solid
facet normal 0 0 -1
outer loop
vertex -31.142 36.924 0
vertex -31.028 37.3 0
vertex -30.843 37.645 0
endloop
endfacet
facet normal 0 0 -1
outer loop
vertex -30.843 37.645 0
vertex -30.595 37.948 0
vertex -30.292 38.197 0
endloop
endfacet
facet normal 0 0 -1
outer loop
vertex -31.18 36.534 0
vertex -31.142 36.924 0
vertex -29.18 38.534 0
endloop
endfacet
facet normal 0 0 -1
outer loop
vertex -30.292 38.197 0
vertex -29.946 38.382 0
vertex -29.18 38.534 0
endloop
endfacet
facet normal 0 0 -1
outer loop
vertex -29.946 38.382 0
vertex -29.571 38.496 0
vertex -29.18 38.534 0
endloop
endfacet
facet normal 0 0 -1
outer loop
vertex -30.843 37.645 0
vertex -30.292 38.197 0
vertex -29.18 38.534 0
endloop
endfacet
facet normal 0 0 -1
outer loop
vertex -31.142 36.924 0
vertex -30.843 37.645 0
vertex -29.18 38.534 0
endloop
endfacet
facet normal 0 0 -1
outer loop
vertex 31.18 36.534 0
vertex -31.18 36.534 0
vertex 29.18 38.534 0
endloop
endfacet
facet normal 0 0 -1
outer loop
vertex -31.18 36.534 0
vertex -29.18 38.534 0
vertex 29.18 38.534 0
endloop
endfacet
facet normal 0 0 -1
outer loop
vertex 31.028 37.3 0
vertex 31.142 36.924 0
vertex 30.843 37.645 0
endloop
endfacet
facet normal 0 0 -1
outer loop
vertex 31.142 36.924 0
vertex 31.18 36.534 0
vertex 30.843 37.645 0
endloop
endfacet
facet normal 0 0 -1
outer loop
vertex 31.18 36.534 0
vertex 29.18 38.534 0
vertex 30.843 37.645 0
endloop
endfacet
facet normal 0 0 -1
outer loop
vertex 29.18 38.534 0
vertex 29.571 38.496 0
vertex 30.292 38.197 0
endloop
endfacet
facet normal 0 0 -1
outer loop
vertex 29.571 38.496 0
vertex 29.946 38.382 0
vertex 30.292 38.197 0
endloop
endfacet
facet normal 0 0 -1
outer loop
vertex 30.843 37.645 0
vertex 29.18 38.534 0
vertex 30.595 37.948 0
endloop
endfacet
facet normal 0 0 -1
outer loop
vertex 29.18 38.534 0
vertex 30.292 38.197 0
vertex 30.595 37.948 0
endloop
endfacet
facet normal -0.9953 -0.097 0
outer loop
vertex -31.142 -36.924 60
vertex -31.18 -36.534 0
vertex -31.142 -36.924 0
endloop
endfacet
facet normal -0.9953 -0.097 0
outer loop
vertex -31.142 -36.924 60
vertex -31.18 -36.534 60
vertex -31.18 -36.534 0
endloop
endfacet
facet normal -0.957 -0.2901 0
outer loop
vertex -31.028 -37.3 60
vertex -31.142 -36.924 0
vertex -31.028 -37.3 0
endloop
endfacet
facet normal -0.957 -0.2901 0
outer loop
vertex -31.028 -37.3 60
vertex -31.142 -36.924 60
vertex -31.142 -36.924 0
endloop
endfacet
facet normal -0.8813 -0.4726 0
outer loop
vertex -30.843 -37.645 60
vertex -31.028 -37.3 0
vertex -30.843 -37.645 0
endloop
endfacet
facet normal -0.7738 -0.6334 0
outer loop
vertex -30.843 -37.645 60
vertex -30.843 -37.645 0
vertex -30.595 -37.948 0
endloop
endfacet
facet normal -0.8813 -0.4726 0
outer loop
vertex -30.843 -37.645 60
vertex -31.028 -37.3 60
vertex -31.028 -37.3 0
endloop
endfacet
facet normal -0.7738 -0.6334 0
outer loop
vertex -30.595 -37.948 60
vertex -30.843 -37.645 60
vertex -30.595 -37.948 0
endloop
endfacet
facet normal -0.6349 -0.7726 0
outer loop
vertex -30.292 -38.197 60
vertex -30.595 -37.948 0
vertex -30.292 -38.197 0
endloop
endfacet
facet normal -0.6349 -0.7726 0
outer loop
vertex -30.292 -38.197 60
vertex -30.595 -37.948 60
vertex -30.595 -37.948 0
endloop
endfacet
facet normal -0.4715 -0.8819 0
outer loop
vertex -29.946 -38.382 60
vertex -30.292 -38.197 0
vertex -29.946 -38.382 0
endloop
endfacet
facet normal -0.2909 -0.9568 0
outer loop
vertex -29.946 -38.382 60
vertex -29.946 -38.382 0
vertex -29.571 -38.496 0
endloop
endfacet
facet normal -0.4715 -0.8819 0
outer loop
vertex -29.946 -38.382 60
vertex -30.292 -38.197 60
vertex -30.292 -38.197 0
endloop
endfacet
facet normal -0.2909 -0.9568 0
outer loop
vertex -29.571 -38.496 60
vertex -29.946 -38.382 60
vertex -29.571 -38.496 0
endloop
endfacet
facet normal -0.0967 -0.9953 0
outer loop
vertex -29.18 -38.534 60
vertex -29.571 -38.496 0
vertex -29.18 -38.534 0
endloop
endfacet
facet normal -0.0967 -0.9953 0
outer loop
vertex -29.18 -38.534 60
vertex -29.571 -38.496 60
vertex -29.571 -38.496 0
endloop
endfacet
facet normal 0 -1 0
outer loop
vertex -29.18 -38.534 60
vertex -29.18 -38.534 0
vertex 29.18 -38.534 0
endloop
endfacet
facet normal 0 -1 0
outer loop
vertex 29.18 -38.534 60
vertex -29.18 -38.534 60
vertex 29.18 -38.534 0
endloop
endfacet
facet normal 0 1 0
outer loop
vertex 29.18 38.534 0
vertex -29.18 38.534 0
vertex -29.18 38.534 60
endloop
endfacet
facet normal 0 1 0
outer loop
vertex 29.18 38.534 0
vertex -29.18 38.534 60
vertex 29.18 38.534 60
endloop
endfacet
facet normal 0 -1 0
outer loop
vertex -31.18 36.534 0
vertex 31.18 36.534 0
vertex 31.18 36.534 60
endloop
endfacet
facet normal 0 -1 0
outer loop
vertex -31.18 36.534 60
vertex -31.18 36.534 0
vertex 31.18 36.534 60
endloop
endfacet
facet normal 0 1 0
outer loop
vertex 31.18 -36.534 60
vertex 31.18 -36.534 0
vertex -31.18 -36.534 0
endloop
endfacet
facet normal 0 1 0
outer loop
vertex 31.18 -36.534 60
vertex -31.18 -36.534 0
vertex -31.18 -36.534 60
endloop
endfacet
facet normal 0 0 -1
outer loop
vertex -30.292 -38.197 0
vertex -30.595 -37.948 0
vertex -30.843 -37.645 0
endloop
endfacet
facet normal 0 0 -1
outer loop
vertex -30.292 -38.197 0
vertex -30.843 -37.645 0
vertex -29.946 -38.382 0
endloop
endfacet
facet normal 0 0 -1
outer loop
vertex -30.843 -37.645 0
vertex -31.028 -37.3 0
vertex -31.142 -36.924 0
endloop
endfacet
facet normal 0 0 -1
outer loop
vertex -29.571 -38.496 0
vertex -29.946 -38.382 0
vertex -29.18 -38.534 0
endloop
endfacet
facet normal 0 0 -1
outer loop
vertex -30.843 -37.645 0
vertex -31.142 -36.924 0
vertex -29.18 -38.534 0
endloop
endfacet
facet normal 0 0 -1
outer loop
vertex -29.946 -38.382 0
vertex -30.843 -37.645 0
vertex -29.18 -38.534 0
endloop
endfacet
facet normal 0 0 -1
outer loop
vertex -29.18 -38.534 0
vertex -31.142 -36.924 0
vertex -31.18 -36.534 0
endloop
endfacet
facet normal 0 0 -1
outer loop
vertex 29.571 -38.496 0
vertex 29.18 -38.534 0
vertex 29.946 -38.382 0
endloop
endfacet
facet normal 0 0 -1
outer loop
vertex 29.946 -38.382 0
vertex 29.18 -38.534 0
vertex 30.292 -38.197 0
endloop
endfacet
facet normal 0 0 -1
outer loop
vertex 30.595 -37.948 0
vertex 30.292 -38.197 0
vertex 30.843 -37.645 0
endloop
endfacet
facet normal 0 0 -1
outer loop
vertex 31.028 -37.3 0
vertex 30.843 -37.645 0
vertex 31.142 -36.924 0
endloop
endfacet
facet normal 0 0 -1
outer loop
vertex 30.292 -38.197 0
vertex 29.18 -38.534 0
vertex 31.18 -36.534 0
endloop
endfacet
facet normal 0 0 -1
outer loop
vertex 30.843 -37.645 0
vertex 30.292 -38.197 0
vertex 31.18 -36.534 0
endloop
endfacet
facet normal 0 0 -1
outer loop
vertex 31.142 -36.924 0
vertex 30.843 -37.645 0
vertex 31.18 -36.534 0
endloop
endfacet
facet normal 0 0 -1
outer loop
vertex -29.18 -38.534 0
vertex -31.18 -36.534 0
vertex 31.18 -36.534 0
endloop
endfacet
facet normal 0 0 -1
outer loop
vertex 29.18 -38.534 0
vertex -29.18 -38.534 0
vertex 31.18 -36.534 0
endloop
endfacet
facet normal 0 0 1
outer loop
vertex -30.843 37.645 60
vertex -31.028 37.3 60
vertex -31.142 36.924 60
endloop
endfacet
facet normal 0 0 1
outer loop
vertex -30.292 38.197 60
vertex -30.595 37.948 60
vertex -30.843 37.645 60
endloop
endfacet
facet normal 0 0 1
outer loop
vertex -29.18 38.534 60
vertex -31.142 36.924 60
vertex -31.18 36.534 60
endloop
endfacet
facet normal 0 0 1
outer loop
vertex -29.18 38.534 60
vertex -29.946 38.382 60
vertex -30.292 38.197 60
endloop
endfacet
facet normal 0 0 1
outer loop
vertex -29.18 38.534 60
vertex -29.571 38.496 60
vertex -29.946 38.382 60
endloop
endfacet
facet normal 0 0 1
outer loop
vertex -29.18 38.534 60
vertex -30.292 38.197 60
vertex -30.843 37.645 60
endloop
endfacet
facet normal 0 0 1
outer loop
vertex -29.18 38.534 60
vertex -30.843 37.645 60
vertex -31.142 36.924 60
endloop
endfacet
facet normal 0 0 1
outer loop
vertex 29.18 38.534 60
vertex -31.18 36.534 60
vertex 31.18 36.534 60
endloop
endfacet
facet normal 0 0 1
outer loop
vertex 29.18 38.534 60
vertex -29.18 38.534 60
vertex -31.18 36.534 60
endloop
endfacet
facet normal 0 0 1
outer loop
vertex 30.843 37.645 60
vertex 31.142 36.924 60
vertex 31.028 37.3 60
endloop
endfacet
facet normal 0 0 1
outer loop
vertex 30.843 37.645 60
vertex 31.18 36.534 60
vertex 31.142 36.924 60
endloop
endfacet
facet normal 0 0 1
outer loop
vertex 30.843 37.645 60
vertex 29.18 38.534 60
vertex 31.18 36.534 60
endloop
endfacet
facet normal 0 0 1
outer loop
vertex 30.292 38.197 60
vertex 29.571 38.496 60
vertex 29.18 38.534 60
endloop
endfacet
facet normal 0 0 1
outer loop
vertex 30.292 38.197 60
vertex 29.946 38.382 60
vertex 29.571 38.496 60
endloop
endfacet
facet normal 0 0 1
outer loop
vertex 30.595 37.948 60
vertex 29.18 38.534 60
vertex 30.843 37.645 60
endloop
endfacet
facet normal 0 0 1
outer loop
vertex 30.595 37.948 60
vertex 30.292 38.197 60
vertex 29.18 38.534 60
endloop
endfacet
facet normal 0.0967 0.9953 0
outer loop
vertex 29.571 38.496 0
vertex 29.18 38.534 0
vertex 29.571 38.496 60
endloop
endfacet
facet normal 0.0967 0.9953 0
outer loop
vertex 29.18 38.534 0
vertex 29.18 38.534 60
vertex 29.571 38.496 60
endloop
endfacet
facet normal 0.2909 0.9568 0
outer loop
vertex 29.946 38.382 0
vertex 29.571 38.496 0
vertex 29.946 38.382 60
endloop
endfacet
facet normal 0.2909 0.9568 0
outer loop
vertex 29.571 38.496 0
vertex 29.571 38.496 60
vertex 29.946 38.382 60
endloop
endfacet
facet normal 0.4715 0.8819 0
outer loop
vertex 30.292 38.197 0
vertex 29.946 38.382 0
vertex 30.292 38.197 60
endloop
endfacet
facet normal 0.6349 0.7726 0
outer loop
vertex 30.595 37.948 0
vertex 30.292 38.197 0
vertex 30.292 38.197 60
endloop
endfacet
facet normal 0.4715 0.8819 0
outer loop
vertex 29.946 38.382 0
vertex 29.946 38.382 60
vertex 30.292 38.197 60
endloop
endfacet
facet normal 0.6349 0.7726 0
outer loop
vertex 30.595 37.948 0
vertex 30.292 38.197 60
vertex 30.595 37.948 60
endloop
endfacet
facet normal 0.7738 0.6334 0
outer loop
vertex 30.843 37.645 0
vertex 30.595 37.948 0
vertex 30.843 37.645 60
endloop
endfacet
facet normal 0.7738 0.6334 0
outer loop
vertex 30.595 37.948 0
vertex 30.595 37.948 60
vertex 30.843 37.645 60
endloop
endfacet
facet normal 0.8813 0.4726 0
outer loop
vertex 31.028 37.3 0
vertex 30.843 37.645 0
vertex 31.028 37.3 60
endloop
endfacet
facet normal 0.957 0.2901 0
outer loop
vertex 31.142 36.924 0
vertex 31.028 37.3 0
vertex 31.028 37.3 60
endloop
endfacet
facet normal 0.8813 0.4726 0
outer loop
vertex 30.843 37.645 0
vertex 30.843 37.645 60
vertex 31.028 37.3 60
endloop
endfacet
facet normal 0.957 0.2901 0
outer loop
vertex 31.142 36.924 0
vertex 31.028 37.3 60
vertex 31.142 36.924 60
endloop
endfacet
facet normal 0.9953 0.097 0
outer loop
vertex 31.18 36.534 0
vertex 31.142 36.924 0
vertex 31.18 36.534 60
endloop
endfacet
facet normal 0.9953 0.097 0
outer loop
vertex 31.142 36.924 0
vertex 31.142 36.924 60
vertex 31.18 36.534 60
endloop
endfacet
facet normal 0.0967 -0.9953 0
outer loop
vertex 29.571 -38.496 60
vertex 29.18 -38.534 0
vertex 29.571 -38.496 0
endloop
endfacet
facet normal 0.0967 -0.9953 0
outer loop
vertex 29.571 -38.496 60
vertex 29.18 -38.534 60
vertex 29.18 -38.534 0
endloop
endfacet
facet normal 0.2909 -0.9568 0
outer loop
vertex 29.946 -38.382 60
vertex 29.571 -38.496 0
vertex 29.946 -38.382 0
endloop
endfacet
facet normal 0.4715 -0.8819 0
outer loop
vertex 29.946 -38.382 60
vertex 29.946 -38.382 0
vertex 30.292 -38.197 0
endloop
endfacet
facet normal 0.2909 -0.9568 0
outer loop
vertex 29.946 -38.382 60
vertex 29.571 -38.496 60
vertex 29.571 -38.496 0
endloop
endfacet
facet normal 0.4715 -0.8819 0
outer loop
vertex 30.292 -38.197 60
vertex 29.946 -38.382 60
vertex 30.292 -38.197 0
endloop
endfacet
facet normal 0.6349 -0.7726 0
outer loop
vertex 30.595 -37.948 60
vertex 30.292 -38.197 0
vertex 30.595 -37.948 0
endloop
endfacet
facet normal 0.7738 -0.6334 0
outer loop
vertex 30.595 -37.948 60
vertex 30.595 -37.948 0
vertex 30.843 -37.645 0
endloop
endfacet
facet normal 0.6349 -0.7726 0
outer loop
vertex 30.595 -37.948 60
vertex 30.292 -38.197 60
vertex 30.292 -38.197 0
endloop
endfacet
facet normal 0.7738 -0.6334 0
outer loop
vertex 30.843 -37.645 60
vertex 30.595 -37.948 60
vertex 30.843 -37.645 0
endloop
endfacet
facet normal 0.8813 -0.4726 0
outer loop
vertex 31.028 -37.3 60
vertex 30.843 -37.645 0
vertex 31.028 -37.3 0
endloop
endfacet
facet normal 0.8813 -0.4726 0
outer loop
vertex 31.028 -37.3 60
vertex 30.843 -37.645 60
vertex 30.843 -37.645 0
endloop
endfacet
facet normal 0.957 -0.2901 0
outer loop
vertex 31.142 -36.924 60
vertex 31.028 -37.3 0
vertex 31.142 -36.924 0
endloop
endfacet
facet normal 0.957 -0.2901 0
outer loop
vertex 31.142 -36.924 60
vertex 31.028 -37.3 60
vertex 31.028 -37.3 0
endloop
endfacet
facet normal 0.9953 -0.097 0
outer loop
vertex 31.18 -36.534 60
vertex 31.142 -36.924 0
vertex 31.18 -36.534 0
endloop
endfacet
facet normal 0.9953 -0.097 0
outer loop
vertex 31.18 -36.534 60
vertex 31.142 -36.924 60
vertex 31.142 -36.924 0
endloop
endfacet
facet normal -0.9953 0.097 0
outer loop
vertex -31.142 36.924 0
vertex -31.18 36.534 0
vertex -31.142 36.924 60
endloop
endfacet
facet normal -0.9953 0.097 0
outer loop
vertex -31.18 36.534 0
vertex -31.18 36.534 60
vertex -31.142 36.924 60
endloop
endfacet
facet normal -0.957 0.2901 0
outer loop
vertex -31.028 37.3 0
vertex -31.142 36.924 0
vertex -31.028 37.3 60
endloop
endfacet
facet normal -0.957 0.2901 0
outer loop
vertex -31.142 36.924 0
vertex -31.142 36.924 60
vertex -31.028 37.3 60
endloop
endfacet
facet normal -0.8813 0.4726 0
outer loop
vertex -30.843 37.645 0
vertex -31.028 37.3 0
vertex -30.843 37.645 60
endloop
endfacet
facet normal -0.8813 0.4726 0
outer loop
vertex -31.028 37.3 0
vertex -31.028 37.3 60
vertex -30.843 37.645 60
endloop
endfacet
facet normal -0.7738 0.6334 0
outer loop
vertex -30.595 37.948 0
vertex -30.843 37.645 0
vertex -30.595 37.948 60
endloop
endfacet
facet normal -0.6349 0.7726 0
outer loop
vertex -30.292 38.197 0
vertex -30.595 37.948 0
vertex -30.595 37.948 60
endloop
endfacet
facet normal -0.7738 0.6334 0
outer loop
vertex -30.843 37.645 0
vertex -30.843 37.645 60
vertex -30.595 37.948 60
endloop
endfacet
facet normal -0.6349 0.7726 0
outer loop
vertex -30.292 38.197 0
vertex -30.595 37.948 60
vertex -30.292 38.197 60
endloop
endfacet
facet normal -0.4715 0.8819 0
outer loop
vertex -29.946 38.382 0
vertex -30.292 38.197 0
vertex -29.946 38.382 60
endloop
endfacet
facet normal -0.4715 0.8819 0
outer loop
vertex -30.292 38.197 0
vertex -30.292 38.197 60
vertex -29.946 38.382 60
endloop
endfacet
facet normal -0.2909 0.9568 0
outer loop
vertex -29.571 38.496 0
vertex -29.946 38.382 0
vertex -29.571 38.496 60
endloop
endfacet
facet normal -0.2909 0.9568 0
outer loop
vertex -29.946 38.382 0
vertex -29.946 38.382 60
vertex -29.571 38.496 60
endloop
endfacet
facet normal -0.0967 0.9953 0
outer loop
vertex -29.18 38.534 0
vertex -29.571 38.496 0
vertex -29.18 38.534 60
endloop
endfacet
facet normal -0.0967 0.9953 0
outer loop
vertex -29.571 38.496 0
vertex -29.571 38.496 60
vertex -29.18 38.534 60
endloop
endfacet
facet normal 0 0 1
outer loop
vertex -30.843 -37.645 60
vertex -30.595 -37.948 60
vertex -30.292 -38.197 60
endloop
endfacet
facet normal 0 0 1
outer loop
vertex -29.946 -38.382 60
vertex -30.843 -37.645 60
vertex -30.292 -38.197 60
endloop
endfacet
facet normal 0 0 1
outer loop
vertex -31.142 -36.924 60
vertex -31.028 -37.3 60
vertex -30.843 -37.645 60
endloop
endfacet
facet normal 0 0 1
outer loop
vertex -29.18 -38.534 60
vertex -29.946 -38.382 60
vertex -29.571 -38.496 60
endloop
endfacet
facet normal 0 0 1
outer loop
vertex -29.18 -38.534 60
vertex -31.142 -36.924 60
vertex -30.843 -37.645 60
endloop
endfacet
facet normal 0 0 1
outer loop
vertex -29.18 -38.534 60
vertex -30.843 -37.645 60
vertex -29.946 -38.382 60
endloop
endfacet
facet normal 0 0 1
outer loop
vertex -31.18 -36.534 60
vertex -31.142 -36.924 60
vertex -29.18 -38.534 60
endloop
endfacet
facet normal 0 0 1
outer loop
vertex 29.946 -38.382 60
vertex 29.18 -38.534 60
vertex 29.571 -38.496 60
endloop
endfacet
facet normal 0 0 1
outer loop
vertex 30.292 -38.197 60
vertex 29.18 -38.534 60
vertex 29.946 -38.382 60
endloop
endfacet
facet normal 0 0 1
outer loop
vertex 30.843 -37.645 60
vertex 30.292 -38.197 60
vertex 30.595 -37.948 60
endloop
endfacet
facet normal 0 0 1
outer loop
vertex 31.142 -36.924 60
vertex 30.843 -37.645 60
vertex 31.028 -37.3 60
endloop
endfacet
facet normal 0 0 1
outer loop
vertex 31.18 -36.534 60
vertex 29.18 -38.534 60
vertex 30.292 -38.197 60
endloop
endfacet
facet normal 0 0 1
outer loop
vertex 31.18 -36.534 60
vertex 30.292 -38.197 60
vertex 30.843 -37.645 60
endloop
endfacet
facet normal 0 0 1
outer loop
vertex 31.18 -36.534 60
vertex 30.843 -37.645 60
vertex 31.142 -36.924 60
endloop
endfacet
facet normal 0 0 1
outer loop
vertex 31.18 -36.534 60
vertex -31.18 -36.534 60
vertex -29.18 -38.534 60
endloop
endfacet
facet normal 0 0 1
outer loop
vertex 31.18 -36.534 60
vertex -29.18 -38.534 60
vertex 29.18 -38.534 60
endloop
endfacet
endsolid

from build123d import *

# Parameters (mm, degrees)
F0_W      = 62.360742
F0_H      = 77.068456
F0_W_2    = 39.41669
F0_H_2    = 51.771178
F1_DEPTH  = 60
F2_R      = 2
F1_FACE_W = 73.068456
F1_FACE_H = 60
F3_DEPTH  = 70


with BuildPart() as f1:
    # F0 (on Top) → F1 (new body)
    with BuildSketch(Plane.XY):
        Rectangle(F0_W, F0_H)
        Rectangle(F0_W_2, F0_H_2, mode=Mode.SUBTRACT)
    extrude(amount=F1_DEPTH)

    # F2
    f2_edges = [f1.edges().sort_by_distance(p)[0] for p in [
        (-31.180371, 38.534228, 30),
        (-31.180371, -38.534228, 30),
        (31.180371, -38.534228, 30),
        (31.180371, 38.534228, 30),
    ]]
    fillet(f2_edges, radius=F2_R)

    # F1_face (on face) → F3 (cut)
    with BuildSketch(Plane(origin=(31.180371, 0, 30), x_dir=(0, 1, 0), z_dir=(1, 0, 0))):
        Rectangle(F1_FACE_W, F1_FACE_H)
    extrude(amount=-F3_DEPTH, mode=Mode.SUBTRACT)


solid = f1.part
